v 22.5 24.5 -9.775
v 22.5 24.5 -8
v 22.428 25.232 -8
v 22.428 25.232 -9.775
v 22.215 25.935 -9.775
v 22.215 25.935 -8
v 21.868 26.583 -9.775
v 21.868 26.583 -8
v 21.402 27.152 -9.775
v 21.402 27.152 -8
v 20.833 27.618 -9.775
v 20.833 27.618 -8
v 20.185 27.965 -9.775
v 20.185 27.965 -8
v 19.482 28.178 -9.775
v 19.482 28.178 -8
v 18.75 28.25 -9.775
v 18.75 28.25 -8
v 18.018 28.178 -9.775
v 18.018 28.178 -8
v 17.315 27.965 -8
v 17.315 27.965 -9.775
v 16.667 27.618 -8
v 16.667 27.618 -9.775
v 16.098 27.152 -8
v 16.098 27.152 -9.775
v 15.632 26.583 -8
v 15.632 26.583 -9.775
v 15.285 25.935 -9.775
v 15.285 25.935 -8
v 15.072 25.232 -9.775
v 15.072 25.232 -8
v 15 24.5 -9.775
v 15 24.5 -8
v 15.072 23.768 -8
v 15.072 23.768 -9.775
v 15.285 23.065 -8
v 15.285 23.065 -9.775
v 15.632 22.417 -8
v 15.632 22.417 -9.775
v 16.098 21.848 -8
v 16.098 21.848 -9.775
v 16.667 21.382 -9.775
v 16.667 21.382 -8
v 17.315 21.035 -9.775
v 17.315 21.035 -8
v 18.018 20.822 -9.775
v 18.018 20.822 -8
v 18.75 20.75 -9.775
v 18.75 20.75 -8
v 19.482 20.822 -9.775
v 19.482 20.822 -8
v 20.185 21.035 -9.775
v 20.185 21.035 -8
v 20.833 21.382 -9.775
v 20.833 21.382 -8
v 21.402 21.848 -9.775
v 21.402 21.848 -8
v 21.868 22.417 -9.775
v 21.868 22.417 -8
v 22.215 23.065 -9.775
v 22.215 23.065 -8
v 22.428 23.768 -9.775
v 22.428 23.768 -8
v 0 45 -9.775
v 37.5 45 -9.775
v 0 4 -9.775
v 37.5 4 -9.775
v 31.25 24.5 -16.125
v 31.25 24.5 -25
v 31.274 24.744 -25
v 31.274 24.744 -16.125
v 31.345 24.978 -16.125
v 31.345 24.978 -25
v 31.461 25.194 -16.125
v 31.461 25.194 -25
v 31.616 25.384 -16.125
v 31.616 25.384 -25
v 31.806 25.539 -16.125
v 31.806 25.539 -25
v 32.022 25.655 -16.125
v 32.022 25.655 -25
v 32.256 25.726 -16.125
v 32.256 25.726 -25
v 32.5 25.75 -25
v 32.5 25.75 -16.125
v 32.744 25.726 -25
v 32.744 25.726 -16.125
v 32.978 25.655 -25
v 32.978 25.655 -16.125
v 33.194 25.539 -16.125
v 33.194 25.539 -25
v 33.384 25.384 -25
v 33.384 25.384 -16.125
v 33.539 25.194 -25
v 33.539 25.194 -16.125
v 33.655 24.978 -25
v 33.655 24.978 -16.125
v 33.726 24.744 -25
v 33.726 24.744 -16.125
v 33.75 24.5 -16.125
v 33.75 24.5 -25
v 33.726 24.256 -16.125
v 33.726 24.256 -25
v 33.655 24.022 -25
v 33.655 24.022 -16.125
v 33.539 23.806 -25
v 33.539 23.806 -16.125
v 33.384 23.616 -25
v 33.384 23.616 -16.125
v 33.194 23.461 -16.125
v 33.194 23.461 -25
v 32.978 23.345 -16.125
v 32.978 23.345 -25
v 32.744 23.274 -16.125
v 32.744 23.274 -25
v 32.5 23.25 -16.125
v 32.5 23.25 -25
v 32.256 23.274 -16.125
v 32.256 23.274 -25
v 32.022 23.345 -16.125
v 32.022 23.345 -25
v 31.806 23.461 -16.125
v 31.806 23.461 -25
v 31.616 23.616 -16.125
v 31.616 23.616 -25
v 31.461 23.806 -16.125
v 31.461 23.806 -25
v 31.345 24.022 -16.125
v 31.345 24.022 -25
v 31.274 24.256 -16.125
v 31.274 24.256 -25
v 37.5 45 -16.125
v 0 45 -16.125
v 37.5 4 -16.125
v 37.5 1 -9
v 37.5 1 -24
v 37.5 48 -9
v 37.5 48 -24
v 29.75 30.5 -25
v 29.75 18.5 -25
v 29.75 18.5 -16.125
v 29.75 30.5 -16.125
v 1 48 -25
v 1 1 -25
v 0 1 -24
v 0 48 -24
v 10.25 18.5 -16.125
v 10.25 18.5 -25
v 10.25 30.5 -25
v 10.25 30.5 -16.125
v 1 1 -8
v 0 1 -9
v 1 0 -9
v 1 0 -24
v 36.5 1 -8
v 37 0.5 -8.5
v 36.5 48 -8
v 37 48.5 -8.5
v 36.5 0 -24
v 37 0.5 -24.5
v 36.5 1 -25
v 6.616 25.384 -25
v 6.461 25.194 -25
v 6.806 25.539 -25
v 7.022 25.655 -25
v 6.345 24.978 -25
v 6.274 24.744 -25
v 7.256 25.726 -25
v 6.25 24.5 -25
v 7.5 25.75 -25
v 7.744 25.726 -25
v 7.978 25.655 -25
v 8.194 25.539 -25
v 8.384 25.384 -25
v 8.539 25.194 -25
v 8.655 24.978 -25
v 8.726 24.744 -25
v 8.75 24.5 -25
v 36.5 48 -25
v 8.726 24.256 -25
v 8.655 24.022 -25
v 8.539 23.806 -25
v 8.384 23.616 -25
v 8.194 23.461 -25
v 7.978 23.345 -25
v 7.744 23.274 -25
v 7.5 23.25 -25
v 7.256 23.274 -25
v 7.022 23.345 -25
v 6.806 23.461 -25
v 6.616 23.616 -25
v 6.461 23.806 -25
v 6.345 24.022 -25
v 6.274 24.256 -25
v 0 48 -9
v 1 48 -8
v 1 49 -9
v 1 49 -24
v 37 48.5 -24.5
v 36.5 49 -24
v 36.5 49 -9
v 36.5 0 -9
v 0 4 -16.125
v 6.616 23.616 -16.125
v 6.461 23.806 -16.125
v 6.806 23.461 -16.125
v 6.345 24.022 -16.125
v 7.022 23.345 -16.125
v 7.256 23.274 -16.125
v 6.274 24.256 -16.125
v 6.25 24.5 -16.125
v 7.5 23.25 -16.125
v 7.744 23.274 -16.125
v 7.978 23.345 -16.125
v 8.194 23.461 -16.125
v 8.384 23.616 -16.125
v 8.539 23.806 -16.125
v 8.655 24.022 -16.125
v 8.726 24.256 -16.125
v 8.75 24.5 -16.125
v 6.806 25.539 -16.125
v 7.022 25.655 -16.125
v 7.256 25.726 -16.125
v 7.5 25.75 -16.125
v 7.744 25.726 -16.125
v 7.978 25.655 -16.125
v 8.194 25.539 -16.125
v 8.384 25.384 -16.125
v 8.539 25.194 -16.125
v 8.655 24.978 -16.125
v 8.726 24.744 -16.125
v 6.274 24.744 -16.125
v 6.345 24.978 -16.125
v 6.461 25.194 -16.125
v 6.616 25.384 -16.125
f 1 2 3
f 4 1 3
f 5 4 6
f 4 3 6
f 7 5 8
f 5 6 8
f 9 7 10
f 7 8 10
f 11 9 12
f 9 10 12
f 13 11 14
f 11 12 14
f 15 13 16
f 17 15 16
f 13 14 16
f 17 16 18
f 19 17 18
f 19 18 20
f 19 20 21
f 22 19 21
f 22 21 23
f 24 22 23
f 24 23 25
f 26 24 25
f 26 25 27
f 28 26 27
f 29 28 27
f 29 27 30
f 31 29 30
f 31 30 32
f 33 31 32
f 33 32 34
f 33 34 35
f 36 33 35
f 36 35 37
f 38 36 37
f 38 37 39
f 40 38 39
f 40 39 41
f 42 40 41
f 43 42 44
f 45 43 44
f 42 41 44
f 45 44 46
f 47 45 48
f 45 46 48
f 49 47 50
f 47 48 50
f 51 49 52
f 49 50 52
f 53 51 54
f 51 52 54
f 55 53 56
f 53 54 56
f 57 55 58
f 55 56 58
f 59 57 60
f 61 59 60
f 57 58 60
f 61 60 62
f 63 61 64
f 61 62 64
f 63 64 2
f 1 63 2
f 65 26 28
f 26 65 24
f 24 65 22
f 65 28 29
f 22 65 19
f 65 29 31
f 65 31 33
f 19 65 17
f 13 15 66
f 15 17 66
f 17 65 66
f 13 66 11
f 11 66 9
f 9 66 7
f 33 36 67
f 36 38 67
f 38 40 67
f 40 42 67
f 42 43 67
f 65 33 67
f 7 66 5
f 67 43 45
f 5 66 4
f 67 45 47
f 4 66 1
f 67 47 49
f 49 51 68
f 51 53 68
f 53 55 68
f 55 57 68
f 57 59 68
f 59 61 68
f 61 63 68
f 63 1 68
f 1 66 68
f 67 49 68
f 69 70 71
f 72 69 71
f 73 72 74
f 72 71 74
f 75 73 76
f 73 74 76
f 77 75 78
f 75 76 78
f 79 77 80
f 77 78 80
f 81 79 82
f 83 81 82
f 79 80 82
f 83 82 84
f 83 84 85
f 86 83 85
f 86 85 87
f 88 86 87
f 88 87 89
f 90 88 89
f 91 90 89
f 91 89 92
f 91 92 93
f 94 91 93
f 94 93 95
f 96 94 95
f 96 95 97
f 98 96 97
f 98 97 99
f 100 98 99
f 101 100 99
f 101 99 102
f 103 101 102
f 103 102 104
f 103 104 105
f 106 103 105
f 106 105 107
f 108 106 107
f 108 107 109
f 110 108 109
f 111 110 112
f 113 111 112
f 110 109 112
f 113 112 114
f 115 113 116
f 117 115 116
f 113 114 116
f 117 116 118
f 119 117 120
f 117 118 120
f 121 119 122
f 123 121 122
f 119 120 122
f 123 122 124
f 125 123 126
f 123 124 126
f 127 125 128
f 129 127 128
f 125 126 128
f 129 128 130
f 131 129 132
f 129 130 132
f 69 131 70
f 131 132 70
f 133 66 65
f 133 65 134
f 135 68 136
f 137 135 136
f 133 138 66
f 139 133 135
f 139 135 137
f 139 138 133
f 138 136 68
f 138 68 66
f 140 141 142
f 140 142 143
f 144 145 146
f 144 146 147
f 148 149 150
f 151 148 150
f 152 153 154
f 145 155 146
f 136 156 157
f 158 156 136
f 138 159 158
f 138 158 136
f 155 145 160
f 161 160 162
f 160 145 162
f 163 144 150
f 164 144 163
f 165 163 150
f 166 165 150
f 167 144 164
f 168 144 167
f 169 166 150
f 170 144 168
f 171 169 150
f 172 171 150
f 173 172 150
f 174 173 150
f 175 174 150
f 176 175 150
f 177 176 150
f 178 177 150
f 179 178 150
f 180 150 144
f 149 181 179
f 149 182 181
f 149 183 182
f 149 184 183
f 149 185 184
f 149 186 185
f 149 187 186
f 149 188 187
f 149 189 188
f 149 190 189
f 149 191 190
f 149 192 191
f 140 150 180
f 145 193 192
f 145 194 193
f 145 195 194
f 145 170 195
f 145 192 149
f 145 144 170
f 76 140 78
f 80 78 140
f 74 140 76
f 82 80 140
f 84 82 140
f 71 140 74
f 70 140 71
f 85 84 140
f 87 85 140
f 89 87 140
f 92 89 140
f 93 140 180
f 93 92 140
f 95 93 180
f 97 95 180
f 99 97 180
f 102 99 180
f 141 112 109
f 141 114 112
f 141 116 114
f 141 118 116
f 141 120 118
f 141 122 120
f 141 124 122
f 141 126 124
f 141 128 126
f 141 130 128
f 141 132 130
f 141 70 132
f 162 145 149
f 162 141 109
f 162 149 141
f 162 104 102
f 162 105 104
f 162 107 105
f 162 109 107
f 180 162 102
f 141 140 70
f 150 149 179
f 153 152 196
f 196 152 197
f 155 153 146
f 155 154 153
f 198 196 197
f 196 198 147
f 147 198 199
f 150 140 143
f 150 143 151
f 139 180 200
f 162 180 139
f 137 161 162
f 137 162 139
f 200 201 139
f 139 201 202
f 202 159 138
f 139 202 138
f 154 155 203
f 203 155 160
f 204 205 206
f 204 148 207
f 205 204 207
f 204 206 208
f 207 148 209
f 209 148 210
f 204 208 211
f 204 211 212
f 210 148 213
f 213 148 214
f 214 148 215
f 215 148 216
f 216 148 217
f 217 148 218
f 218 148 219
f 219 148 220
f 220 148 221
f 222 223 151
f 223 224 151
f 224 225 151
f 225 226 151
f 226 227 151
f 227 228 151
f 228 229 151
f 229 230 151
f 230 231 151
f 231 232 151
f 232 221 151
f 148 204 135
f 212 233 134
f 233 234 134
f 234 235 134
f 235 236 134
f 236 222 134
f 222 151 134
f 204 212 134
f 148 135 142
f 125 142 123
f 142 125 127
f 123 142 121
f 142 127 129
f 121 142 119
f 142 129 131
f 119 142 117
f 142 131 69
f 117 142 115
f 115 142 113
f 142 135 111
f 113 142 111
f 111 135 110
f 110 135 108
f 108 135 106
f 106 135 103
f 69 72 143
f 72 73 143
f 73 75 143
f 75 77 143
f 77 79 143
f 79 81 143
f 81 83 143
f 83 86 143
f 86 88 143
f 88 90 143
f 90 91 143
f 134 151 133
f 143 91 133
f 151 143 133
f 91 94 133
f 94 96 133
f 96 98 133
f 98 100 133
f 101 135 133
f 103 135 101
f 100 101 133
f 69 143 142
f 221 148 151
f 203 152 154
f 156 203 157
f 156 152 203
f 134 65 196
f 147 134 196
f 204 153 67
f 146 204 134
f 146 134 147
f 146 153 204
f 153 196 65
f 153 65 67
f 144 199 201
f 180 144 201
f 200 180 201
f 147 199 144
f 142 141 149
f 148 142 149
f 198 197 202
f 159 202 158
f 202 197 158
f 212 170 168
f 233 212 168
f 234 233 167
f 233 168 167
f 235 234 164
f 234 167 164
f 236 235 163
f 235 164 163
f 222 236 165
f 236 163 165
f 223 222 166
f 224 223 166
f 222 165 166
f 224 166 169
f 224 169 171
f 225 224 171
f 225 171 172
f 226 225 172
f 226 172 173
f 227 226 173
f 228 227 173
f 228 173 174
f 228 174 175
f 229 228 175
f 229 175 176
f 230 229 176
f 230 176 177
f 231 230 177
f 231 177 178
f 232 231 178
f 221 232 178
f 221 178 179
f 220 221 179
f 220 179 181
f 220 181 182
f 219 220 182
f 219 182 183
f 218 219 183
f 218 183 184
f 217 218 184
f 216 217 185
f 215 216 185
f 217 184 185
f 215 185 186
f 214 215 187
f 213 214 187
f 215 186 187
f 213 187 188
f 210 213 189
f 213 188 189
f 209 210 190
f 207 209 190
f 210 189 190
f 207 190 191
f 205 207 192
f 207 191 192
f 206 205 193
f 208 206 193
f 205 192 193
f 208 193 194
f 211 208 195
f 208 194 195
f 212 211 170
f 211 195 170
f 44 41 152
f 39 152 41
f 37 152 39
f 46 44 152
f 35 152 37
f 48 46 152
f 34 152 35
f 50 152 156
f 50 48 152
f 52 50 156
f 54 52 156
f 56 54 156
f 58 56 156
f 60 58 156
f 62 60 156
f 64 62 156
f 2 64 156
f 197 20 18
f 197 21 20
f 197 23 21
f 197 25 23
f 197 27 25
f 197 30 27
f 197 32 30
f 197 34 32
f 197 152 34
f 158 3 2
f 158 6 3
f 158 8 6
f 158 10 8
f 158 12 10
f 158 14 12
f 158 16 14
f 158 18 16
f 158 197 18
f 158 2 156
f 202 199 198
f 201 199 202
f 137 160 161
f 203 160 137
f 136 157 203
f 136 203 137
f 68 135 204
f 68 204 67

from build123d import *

# Parameters (mm, degrees)
SKETCH1_W           = 50
SKETCH1_H           = 25
BOSS_EXTRUDE1_DEPTH = 49
CUT_EXTRUDE2_DEPTH  = 55
SKETCH5_R           = 1.25
SKETCH5_W           = 19.5
SKETCH5_H           = 12
CUT_EXTRUDE3_DEPTH  = 12.5
SKETCH7_W           = 50
SKETCH7_H           = 49
CUT_EXTRUDE4_DEPTH  = 8
CHAMFER1_SIZE       = 1
SKETCH8_W           = 17.539951448
SKETCH8_H           = 49.569428005
CUT_EXTRUDE5_DEPTH  = 12.5
CHAMFER2_SIZE       = 1
SKETCH9_R           = 3.75
CUT_EXTRUDE6_DEPTH  = 4


with BuildPart() as part:
    # Sketch1 → Boss-Extrude1 (new body)
    with BuildSketch(Plane(origin=(0, 0, 0), x_dir=(1, 0, 0), z_dir=(0, 1, 0))):
        with Locations((25, 12.5)):
            Rectangle(SKETCH1_W, SKETCH1_H)
    extrude(amount=BOSS_EXTRUDE1_DEPTH)

    # Sketch4 → Cut-Extrude2 (cut)
    with BuildSketch(Plane(origin=(50, 0, 0), x_dir=(0, 0, -1), z_dir=(1, 0, 0))):
        Polygon((9.775, 45), (16.125, 45), (16.125, 34.127502784), (16.125, 12.627502784), (16.125, 4), (9.775, 4), (9.775, 13.75), (9.775, 35.25), align=None)
    extrude(amount=-CUT_EXTRUDE2_DEPTH, mode=Mode.SUBTRACT)

    # Sketch5 → Cut-Extrude3 (cut)
    with BuildSketch(Plane(origin=(0, 0, -25), x_dir=(-1, 0, 0), z_dir=(0, 0, -1))):
        with Locations((-32.5, 24.5)):
            Circle(SKETCH5_R)
        with Locations((-7.5, 24.5)):
            Circle(SKETCH5_R)
        with Locations((-20, 24.5)):
            Rectangle(SKETCH5_W, SKETCH5_H)
    extrude(amount=-CUT_EXTRUDE3_DEPTH, mode=Mode.SUBTRACT)

    # Sketch7 → Cut-Extrude4 (cut)
    with BuildSketch(Plane.XY):
        with Locations((25, 24.5)):
            Rectangle(SKETCH7_W, SKETCH7_H)
    extrude(amount=-CUT_EXTRUDE4_DEPTH, mode=Mode.SUBTRACT)

    # Chamfer1
    chamfer1_edges = [part.edges().sort_by_distance(p)[0] for p in [
        (25, 49, -25),
        (0, 49, -16.5),
        (25, 0, -25),
        (0, 0, -16.5),
        (50, 0, -16.5),
        (50, 49, -16.5),
        (0, 24.5, -8),
        (25, 49, -8),
        (50, 24.5, -8),
        (25, 0, -8),
        (0, 24.5, -25),
        (50, 24.5, -25),
    ]]
    chamfer(chamfer1_edges, length=CHAMFER1_SIZE)

    # Sketch8 → Cut-Extrude5 (cut)
    with BuildSketch(Plane(origin=(50, 0, 0), x_dir=(0, 0, -1), z_dir=(1, 0, 0))):
        with Locations((16.404674177, 24.368191016)):
            Rectangle(SKETCH8_W, SKETCH8_H)
    extrude(amount=-CUT_EXTRUDE5_DEPTH, mode=Mode.SUBTRACT)

    # Chamfer2
    # the kernel refuses this chamfer: 1 mm, written as the material it takes off along each edge
    with BuildSketch(Plane(origin=(37.5, 0, -6.428317012), x_dir=(-0.9996219169112968, -0.027495876610586292, 0), z_dir=(0, 0, -1))) as chamfer2_piece_1:
        Polygon((CHAMFER2_SIZE * 0.999621916911, CHAMFER2_SIZE * 0.0274958766106), (-CHAMFER2_SIZE * 0.0274958766106, CHAMFER2_SIZE * 0.999621916911), (0, 0), align=None)
    extrude(amount=20.143365976, mode=Mode.SUBTRACT)
    with BuildSketch(Plane(origin=(37.5, 49, -6.428317012), x_dir=(-0.9996219169112968, 0.027495876610589005, 0), z_dir=(0, 0, -1))) as chamfer2_piece_2:
        Polygon((CHAMFER2_SIZE * 0.999621916911, -CHAMFER2_SIZE * 0.0274958766106), (-CHAMFER2_SIZE * 0.0274958766106, -CHAMFER2_SIZE * 0.999621916911), (0, 0), align=None)
    extrude(amount=20.143365976, mode=Mode.SUBTRACT)
    with BuildSketch(Plane(origin=(37.5, 50.571682988, -8), x_dir=(-0.9996219169112968, 0, 0.027495876610586414), z_dir=(0, -1, 0)), Plane(origin=(37.5, -1.571682988, -25), x_dir=(-0.9996219169112968, 0, -0.02749587661058555), z_dir=(0, 1, 0))) as chamfer2_piece_3:
        Polygon((CHAMFER2_SIZE * 0.999621916911, CHAMFER2_SIZE * 0.0274958766106), (-CHAMFER2_SIZE * 0.0274958766106, CHAMFER2_SIZE * 0.999621916911), (0, 0), align=None)
    extrude(amount=52.143365976, mode=Mode.SUBTRACT)

    # Sketch9 → Cut-Extrude6 (cut)
    with BuildSketch(Plane.XY.offset(-8)):
        with Locations((18.75, 24.5)):
            Circle(SKETCH9_R)
    extrude(amount=-CUT_EXTRUDE6_DEPTH, mode=Mode.SUBTRACT)


solid = part.part
